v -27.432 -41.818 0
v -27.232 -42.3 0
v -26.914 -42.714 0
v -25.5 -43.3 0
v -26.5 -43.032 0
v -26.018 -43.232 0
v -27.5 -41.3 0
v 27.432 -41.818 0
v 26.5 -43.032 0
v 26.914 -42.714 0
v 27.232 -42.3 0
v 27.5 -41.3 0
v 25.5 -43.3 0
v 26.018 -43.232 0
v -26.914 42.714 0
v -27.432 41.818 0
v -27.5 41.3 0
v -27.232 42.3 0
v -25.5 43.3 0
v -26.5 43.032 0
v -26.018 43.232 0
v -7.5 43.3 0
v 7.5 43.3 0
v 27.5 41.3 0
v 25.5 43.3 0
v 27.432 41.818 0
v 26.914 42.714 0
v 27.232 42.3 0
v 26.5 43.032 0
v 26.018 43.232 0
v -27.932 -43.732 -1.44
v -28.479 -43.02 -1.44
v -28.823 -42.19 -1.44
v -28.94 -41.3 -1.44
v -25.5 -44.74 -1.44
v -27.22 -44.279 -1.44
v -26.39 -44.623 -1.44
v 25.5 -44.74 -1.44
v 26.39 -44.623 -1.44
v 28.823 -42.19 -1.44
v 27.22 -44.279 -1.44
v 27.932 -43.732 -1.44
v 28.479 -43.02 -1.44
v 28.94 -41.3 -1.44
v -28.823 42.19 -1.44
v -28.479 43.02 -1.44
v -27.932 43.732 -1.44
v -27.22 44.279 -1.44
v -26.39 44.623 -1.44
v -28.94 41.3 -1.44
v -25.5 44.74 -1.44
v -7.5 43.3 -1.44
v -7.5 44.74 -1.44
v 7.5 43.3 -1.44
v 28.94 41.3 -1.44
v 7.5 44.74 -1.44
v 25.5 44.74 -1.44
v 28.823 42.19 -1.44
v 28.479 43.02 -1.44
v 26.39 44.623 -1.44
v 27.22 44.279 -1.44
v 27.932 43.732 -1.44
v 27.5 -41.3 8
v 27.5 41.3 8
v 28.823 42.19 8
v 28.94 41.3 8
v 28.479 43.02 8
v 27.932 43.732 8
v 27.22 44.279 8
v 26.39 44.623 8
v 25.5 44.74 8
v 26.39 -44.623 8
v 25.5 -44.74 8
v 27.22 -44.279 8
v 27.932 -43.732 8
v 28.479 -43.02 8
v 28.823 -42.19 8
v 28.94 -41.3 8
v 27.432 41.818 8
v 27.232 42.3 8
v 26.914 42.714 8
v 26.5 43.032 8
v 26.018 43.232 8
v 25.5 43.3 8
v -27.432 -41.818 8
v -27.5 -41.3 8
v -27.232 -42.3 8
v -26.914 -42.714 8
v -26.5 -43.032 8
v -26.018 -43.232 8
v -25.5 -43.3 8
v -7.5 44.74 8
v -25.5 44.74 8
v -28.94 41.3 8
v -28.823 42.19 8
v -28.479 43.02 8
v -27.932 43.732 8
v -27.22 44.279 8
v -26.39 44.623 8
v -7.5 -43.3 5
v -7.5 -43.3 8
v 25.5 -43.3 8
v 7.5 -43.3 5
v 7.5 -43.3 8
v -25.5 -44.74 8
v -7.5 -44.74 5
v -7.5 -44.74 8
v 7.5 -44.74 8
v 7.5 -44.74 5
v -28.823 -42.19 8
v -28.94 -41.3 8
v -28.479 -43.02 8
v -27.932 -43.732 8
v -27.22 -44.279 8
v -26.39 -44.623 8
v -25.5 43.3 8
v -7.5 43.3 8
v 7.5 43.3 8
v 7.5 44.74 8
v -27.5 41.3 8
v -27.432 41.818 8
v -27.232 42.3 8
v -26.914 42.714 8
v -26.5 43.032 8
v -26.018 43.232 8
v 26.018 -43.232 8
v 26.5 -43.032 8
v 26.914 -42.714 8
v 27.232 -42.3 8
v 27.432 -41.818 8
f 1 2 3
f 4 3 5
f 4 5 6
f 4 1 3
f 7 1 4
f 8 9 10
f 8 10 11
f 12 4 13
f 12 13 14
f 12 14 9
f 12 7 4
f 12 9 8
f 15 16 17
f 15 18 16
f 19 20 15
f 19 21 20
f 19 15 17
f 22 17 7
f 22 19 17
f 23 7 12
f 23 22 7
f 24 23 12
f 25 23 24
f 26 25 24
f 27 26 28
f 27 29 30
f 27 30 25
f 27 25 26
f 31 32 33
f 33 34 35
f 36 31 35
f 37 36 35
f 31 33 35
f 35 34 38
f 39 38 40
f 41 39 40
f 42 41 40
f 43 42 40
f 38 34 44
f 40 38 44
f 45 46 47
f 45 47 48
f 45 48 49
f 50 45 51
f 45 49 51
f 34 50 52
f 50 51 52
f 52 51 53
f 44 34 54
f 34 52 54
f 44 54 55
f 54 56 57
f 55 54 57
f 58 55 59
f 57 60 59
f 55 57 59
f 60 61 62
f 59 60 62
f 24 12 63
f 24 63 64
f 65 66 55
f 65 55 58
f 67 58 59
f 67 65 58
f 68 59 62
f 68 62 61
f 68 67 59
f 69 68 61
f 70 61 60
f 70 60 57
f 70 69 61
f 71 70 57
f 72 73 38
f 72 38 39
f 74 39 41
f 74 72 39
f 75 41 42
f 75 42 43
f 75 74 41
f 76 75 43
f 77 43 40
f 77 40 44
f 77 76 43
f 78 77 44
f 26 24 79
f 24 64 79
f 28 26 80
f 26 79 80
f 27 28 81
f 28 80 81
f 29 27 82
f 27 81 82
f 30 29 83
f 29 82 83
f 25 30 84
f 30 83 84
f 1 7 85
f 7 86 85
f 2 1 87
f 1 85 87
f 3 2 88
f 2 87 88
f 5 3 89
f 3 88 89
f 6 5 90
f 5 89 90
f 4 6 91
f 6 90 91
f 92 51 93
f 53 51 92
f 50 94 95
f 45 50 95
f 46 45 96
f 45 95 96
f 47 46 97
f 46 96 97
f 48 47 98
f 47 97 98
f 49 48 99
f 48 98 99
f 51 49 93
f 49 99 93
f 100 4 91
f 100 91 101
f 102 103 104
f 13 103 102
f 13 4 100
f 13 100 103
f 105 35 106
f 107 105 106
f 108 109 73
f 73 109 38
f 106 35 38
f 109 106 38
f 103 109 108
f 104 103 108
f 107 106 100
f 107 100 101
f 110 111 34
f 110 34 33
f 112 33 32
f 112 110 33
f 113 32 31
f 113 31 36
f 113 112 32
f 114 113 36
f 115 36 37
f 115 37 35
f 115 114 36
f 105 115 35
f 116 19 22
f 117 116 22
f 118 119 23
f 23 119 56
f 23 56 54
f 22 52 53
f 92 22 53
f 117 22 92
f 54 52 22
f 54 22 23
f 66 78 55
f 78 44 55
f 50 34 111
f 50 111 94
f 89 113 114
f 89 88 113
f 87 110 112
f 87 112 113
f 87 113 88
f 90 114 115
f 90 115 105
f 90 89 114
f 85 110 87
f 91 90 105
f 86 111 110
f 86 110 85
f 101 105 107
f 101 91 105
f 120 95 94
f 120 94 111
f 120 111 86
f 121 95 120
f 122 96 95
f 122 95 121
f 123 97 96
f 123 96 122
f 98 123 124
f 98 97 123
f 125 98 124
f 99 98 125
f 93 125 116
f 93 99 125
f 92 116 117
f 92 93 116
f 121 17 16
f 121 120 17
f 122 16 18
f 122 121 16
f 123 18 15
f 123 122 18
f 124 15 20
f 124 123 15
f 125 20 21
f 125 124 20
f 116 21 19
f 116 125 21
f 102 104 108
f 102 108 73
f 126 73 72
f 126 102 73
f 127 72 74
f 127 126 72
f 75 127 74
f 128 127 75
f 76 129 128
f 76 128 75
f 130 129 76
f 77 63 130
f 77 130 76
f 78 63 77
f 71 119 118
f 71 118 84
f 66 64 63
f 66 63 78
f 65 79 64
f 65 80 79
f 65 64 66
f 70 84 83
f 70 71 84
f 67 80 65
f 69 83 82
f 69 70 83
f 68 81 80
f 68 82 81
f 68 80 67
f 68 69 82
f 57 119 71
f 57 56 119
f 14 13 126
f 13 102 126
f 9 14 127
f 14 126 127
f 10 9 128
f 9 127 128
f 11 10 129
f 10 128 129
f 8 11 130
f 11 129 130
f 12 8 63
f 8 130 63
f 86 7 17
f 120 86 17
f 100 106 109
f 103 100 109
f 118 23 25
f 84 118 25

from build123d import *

# Parameters (mm, degrees)
F0_W     = 55
F0_H     = 86.6
F1_DEPTH = 8
F2_R     = 2
F3_T     = 1.44
F4_W     = 15
F4_H     = 3
F5_DEPTH = 48.1
F6_W     = 15
F6_H     = 1.44
F7_DEPTH = 25


with BuildPart() as f1:
    # F0 (on Top) → F1 (new body)
    with BuildSketch(Plane.XY):
        Rectangle(F0_W, F0_H)
    extrude(amount=F1_DEPTH)

    # F2
    f2_edges = [f1.edges().sort_by_distance(p)[0] for p in [
        (-27.5, -43.3, 4),
        (27.5, -43.3, 4),
        (27.5, 43.3, 4),
        (-27.5, 43.3, 4),
    ]]
    fillet(f2_edges, radius=F2_R)

    # F3
    f3_openings = [f1.faces().sort_by_distance(p)[0] for p in [
        (0, 0, 8),
    ]]
    offset(amount=F3_T, openings=f3_openings, kind=Kind.INTERSECTION)

    # F4 (on Front) → F5 (cut, symmetric)
    with BuildSketch(Plane.XZ):
        with Locations((0, 6.5)):
            Rectangle(F4_W, F4_H)
    extrude(amount=F5_DEPTH, both=True, mode=Mode.SUBTRACT)

    # F6 (on face) → F7 (cut)
    with BuildSketch(Plane(origin=(0, 0, -1.44), x_dir=(1, 0, 0), z_dir=(0, 0, -1))):
        with Locations((0, -44.02)):
            Rectangle(F6_W, F6_H)
    extrude(amount=-F7_DEPTH, mode=Mode.SUBTRACT)


solid = f1.part
